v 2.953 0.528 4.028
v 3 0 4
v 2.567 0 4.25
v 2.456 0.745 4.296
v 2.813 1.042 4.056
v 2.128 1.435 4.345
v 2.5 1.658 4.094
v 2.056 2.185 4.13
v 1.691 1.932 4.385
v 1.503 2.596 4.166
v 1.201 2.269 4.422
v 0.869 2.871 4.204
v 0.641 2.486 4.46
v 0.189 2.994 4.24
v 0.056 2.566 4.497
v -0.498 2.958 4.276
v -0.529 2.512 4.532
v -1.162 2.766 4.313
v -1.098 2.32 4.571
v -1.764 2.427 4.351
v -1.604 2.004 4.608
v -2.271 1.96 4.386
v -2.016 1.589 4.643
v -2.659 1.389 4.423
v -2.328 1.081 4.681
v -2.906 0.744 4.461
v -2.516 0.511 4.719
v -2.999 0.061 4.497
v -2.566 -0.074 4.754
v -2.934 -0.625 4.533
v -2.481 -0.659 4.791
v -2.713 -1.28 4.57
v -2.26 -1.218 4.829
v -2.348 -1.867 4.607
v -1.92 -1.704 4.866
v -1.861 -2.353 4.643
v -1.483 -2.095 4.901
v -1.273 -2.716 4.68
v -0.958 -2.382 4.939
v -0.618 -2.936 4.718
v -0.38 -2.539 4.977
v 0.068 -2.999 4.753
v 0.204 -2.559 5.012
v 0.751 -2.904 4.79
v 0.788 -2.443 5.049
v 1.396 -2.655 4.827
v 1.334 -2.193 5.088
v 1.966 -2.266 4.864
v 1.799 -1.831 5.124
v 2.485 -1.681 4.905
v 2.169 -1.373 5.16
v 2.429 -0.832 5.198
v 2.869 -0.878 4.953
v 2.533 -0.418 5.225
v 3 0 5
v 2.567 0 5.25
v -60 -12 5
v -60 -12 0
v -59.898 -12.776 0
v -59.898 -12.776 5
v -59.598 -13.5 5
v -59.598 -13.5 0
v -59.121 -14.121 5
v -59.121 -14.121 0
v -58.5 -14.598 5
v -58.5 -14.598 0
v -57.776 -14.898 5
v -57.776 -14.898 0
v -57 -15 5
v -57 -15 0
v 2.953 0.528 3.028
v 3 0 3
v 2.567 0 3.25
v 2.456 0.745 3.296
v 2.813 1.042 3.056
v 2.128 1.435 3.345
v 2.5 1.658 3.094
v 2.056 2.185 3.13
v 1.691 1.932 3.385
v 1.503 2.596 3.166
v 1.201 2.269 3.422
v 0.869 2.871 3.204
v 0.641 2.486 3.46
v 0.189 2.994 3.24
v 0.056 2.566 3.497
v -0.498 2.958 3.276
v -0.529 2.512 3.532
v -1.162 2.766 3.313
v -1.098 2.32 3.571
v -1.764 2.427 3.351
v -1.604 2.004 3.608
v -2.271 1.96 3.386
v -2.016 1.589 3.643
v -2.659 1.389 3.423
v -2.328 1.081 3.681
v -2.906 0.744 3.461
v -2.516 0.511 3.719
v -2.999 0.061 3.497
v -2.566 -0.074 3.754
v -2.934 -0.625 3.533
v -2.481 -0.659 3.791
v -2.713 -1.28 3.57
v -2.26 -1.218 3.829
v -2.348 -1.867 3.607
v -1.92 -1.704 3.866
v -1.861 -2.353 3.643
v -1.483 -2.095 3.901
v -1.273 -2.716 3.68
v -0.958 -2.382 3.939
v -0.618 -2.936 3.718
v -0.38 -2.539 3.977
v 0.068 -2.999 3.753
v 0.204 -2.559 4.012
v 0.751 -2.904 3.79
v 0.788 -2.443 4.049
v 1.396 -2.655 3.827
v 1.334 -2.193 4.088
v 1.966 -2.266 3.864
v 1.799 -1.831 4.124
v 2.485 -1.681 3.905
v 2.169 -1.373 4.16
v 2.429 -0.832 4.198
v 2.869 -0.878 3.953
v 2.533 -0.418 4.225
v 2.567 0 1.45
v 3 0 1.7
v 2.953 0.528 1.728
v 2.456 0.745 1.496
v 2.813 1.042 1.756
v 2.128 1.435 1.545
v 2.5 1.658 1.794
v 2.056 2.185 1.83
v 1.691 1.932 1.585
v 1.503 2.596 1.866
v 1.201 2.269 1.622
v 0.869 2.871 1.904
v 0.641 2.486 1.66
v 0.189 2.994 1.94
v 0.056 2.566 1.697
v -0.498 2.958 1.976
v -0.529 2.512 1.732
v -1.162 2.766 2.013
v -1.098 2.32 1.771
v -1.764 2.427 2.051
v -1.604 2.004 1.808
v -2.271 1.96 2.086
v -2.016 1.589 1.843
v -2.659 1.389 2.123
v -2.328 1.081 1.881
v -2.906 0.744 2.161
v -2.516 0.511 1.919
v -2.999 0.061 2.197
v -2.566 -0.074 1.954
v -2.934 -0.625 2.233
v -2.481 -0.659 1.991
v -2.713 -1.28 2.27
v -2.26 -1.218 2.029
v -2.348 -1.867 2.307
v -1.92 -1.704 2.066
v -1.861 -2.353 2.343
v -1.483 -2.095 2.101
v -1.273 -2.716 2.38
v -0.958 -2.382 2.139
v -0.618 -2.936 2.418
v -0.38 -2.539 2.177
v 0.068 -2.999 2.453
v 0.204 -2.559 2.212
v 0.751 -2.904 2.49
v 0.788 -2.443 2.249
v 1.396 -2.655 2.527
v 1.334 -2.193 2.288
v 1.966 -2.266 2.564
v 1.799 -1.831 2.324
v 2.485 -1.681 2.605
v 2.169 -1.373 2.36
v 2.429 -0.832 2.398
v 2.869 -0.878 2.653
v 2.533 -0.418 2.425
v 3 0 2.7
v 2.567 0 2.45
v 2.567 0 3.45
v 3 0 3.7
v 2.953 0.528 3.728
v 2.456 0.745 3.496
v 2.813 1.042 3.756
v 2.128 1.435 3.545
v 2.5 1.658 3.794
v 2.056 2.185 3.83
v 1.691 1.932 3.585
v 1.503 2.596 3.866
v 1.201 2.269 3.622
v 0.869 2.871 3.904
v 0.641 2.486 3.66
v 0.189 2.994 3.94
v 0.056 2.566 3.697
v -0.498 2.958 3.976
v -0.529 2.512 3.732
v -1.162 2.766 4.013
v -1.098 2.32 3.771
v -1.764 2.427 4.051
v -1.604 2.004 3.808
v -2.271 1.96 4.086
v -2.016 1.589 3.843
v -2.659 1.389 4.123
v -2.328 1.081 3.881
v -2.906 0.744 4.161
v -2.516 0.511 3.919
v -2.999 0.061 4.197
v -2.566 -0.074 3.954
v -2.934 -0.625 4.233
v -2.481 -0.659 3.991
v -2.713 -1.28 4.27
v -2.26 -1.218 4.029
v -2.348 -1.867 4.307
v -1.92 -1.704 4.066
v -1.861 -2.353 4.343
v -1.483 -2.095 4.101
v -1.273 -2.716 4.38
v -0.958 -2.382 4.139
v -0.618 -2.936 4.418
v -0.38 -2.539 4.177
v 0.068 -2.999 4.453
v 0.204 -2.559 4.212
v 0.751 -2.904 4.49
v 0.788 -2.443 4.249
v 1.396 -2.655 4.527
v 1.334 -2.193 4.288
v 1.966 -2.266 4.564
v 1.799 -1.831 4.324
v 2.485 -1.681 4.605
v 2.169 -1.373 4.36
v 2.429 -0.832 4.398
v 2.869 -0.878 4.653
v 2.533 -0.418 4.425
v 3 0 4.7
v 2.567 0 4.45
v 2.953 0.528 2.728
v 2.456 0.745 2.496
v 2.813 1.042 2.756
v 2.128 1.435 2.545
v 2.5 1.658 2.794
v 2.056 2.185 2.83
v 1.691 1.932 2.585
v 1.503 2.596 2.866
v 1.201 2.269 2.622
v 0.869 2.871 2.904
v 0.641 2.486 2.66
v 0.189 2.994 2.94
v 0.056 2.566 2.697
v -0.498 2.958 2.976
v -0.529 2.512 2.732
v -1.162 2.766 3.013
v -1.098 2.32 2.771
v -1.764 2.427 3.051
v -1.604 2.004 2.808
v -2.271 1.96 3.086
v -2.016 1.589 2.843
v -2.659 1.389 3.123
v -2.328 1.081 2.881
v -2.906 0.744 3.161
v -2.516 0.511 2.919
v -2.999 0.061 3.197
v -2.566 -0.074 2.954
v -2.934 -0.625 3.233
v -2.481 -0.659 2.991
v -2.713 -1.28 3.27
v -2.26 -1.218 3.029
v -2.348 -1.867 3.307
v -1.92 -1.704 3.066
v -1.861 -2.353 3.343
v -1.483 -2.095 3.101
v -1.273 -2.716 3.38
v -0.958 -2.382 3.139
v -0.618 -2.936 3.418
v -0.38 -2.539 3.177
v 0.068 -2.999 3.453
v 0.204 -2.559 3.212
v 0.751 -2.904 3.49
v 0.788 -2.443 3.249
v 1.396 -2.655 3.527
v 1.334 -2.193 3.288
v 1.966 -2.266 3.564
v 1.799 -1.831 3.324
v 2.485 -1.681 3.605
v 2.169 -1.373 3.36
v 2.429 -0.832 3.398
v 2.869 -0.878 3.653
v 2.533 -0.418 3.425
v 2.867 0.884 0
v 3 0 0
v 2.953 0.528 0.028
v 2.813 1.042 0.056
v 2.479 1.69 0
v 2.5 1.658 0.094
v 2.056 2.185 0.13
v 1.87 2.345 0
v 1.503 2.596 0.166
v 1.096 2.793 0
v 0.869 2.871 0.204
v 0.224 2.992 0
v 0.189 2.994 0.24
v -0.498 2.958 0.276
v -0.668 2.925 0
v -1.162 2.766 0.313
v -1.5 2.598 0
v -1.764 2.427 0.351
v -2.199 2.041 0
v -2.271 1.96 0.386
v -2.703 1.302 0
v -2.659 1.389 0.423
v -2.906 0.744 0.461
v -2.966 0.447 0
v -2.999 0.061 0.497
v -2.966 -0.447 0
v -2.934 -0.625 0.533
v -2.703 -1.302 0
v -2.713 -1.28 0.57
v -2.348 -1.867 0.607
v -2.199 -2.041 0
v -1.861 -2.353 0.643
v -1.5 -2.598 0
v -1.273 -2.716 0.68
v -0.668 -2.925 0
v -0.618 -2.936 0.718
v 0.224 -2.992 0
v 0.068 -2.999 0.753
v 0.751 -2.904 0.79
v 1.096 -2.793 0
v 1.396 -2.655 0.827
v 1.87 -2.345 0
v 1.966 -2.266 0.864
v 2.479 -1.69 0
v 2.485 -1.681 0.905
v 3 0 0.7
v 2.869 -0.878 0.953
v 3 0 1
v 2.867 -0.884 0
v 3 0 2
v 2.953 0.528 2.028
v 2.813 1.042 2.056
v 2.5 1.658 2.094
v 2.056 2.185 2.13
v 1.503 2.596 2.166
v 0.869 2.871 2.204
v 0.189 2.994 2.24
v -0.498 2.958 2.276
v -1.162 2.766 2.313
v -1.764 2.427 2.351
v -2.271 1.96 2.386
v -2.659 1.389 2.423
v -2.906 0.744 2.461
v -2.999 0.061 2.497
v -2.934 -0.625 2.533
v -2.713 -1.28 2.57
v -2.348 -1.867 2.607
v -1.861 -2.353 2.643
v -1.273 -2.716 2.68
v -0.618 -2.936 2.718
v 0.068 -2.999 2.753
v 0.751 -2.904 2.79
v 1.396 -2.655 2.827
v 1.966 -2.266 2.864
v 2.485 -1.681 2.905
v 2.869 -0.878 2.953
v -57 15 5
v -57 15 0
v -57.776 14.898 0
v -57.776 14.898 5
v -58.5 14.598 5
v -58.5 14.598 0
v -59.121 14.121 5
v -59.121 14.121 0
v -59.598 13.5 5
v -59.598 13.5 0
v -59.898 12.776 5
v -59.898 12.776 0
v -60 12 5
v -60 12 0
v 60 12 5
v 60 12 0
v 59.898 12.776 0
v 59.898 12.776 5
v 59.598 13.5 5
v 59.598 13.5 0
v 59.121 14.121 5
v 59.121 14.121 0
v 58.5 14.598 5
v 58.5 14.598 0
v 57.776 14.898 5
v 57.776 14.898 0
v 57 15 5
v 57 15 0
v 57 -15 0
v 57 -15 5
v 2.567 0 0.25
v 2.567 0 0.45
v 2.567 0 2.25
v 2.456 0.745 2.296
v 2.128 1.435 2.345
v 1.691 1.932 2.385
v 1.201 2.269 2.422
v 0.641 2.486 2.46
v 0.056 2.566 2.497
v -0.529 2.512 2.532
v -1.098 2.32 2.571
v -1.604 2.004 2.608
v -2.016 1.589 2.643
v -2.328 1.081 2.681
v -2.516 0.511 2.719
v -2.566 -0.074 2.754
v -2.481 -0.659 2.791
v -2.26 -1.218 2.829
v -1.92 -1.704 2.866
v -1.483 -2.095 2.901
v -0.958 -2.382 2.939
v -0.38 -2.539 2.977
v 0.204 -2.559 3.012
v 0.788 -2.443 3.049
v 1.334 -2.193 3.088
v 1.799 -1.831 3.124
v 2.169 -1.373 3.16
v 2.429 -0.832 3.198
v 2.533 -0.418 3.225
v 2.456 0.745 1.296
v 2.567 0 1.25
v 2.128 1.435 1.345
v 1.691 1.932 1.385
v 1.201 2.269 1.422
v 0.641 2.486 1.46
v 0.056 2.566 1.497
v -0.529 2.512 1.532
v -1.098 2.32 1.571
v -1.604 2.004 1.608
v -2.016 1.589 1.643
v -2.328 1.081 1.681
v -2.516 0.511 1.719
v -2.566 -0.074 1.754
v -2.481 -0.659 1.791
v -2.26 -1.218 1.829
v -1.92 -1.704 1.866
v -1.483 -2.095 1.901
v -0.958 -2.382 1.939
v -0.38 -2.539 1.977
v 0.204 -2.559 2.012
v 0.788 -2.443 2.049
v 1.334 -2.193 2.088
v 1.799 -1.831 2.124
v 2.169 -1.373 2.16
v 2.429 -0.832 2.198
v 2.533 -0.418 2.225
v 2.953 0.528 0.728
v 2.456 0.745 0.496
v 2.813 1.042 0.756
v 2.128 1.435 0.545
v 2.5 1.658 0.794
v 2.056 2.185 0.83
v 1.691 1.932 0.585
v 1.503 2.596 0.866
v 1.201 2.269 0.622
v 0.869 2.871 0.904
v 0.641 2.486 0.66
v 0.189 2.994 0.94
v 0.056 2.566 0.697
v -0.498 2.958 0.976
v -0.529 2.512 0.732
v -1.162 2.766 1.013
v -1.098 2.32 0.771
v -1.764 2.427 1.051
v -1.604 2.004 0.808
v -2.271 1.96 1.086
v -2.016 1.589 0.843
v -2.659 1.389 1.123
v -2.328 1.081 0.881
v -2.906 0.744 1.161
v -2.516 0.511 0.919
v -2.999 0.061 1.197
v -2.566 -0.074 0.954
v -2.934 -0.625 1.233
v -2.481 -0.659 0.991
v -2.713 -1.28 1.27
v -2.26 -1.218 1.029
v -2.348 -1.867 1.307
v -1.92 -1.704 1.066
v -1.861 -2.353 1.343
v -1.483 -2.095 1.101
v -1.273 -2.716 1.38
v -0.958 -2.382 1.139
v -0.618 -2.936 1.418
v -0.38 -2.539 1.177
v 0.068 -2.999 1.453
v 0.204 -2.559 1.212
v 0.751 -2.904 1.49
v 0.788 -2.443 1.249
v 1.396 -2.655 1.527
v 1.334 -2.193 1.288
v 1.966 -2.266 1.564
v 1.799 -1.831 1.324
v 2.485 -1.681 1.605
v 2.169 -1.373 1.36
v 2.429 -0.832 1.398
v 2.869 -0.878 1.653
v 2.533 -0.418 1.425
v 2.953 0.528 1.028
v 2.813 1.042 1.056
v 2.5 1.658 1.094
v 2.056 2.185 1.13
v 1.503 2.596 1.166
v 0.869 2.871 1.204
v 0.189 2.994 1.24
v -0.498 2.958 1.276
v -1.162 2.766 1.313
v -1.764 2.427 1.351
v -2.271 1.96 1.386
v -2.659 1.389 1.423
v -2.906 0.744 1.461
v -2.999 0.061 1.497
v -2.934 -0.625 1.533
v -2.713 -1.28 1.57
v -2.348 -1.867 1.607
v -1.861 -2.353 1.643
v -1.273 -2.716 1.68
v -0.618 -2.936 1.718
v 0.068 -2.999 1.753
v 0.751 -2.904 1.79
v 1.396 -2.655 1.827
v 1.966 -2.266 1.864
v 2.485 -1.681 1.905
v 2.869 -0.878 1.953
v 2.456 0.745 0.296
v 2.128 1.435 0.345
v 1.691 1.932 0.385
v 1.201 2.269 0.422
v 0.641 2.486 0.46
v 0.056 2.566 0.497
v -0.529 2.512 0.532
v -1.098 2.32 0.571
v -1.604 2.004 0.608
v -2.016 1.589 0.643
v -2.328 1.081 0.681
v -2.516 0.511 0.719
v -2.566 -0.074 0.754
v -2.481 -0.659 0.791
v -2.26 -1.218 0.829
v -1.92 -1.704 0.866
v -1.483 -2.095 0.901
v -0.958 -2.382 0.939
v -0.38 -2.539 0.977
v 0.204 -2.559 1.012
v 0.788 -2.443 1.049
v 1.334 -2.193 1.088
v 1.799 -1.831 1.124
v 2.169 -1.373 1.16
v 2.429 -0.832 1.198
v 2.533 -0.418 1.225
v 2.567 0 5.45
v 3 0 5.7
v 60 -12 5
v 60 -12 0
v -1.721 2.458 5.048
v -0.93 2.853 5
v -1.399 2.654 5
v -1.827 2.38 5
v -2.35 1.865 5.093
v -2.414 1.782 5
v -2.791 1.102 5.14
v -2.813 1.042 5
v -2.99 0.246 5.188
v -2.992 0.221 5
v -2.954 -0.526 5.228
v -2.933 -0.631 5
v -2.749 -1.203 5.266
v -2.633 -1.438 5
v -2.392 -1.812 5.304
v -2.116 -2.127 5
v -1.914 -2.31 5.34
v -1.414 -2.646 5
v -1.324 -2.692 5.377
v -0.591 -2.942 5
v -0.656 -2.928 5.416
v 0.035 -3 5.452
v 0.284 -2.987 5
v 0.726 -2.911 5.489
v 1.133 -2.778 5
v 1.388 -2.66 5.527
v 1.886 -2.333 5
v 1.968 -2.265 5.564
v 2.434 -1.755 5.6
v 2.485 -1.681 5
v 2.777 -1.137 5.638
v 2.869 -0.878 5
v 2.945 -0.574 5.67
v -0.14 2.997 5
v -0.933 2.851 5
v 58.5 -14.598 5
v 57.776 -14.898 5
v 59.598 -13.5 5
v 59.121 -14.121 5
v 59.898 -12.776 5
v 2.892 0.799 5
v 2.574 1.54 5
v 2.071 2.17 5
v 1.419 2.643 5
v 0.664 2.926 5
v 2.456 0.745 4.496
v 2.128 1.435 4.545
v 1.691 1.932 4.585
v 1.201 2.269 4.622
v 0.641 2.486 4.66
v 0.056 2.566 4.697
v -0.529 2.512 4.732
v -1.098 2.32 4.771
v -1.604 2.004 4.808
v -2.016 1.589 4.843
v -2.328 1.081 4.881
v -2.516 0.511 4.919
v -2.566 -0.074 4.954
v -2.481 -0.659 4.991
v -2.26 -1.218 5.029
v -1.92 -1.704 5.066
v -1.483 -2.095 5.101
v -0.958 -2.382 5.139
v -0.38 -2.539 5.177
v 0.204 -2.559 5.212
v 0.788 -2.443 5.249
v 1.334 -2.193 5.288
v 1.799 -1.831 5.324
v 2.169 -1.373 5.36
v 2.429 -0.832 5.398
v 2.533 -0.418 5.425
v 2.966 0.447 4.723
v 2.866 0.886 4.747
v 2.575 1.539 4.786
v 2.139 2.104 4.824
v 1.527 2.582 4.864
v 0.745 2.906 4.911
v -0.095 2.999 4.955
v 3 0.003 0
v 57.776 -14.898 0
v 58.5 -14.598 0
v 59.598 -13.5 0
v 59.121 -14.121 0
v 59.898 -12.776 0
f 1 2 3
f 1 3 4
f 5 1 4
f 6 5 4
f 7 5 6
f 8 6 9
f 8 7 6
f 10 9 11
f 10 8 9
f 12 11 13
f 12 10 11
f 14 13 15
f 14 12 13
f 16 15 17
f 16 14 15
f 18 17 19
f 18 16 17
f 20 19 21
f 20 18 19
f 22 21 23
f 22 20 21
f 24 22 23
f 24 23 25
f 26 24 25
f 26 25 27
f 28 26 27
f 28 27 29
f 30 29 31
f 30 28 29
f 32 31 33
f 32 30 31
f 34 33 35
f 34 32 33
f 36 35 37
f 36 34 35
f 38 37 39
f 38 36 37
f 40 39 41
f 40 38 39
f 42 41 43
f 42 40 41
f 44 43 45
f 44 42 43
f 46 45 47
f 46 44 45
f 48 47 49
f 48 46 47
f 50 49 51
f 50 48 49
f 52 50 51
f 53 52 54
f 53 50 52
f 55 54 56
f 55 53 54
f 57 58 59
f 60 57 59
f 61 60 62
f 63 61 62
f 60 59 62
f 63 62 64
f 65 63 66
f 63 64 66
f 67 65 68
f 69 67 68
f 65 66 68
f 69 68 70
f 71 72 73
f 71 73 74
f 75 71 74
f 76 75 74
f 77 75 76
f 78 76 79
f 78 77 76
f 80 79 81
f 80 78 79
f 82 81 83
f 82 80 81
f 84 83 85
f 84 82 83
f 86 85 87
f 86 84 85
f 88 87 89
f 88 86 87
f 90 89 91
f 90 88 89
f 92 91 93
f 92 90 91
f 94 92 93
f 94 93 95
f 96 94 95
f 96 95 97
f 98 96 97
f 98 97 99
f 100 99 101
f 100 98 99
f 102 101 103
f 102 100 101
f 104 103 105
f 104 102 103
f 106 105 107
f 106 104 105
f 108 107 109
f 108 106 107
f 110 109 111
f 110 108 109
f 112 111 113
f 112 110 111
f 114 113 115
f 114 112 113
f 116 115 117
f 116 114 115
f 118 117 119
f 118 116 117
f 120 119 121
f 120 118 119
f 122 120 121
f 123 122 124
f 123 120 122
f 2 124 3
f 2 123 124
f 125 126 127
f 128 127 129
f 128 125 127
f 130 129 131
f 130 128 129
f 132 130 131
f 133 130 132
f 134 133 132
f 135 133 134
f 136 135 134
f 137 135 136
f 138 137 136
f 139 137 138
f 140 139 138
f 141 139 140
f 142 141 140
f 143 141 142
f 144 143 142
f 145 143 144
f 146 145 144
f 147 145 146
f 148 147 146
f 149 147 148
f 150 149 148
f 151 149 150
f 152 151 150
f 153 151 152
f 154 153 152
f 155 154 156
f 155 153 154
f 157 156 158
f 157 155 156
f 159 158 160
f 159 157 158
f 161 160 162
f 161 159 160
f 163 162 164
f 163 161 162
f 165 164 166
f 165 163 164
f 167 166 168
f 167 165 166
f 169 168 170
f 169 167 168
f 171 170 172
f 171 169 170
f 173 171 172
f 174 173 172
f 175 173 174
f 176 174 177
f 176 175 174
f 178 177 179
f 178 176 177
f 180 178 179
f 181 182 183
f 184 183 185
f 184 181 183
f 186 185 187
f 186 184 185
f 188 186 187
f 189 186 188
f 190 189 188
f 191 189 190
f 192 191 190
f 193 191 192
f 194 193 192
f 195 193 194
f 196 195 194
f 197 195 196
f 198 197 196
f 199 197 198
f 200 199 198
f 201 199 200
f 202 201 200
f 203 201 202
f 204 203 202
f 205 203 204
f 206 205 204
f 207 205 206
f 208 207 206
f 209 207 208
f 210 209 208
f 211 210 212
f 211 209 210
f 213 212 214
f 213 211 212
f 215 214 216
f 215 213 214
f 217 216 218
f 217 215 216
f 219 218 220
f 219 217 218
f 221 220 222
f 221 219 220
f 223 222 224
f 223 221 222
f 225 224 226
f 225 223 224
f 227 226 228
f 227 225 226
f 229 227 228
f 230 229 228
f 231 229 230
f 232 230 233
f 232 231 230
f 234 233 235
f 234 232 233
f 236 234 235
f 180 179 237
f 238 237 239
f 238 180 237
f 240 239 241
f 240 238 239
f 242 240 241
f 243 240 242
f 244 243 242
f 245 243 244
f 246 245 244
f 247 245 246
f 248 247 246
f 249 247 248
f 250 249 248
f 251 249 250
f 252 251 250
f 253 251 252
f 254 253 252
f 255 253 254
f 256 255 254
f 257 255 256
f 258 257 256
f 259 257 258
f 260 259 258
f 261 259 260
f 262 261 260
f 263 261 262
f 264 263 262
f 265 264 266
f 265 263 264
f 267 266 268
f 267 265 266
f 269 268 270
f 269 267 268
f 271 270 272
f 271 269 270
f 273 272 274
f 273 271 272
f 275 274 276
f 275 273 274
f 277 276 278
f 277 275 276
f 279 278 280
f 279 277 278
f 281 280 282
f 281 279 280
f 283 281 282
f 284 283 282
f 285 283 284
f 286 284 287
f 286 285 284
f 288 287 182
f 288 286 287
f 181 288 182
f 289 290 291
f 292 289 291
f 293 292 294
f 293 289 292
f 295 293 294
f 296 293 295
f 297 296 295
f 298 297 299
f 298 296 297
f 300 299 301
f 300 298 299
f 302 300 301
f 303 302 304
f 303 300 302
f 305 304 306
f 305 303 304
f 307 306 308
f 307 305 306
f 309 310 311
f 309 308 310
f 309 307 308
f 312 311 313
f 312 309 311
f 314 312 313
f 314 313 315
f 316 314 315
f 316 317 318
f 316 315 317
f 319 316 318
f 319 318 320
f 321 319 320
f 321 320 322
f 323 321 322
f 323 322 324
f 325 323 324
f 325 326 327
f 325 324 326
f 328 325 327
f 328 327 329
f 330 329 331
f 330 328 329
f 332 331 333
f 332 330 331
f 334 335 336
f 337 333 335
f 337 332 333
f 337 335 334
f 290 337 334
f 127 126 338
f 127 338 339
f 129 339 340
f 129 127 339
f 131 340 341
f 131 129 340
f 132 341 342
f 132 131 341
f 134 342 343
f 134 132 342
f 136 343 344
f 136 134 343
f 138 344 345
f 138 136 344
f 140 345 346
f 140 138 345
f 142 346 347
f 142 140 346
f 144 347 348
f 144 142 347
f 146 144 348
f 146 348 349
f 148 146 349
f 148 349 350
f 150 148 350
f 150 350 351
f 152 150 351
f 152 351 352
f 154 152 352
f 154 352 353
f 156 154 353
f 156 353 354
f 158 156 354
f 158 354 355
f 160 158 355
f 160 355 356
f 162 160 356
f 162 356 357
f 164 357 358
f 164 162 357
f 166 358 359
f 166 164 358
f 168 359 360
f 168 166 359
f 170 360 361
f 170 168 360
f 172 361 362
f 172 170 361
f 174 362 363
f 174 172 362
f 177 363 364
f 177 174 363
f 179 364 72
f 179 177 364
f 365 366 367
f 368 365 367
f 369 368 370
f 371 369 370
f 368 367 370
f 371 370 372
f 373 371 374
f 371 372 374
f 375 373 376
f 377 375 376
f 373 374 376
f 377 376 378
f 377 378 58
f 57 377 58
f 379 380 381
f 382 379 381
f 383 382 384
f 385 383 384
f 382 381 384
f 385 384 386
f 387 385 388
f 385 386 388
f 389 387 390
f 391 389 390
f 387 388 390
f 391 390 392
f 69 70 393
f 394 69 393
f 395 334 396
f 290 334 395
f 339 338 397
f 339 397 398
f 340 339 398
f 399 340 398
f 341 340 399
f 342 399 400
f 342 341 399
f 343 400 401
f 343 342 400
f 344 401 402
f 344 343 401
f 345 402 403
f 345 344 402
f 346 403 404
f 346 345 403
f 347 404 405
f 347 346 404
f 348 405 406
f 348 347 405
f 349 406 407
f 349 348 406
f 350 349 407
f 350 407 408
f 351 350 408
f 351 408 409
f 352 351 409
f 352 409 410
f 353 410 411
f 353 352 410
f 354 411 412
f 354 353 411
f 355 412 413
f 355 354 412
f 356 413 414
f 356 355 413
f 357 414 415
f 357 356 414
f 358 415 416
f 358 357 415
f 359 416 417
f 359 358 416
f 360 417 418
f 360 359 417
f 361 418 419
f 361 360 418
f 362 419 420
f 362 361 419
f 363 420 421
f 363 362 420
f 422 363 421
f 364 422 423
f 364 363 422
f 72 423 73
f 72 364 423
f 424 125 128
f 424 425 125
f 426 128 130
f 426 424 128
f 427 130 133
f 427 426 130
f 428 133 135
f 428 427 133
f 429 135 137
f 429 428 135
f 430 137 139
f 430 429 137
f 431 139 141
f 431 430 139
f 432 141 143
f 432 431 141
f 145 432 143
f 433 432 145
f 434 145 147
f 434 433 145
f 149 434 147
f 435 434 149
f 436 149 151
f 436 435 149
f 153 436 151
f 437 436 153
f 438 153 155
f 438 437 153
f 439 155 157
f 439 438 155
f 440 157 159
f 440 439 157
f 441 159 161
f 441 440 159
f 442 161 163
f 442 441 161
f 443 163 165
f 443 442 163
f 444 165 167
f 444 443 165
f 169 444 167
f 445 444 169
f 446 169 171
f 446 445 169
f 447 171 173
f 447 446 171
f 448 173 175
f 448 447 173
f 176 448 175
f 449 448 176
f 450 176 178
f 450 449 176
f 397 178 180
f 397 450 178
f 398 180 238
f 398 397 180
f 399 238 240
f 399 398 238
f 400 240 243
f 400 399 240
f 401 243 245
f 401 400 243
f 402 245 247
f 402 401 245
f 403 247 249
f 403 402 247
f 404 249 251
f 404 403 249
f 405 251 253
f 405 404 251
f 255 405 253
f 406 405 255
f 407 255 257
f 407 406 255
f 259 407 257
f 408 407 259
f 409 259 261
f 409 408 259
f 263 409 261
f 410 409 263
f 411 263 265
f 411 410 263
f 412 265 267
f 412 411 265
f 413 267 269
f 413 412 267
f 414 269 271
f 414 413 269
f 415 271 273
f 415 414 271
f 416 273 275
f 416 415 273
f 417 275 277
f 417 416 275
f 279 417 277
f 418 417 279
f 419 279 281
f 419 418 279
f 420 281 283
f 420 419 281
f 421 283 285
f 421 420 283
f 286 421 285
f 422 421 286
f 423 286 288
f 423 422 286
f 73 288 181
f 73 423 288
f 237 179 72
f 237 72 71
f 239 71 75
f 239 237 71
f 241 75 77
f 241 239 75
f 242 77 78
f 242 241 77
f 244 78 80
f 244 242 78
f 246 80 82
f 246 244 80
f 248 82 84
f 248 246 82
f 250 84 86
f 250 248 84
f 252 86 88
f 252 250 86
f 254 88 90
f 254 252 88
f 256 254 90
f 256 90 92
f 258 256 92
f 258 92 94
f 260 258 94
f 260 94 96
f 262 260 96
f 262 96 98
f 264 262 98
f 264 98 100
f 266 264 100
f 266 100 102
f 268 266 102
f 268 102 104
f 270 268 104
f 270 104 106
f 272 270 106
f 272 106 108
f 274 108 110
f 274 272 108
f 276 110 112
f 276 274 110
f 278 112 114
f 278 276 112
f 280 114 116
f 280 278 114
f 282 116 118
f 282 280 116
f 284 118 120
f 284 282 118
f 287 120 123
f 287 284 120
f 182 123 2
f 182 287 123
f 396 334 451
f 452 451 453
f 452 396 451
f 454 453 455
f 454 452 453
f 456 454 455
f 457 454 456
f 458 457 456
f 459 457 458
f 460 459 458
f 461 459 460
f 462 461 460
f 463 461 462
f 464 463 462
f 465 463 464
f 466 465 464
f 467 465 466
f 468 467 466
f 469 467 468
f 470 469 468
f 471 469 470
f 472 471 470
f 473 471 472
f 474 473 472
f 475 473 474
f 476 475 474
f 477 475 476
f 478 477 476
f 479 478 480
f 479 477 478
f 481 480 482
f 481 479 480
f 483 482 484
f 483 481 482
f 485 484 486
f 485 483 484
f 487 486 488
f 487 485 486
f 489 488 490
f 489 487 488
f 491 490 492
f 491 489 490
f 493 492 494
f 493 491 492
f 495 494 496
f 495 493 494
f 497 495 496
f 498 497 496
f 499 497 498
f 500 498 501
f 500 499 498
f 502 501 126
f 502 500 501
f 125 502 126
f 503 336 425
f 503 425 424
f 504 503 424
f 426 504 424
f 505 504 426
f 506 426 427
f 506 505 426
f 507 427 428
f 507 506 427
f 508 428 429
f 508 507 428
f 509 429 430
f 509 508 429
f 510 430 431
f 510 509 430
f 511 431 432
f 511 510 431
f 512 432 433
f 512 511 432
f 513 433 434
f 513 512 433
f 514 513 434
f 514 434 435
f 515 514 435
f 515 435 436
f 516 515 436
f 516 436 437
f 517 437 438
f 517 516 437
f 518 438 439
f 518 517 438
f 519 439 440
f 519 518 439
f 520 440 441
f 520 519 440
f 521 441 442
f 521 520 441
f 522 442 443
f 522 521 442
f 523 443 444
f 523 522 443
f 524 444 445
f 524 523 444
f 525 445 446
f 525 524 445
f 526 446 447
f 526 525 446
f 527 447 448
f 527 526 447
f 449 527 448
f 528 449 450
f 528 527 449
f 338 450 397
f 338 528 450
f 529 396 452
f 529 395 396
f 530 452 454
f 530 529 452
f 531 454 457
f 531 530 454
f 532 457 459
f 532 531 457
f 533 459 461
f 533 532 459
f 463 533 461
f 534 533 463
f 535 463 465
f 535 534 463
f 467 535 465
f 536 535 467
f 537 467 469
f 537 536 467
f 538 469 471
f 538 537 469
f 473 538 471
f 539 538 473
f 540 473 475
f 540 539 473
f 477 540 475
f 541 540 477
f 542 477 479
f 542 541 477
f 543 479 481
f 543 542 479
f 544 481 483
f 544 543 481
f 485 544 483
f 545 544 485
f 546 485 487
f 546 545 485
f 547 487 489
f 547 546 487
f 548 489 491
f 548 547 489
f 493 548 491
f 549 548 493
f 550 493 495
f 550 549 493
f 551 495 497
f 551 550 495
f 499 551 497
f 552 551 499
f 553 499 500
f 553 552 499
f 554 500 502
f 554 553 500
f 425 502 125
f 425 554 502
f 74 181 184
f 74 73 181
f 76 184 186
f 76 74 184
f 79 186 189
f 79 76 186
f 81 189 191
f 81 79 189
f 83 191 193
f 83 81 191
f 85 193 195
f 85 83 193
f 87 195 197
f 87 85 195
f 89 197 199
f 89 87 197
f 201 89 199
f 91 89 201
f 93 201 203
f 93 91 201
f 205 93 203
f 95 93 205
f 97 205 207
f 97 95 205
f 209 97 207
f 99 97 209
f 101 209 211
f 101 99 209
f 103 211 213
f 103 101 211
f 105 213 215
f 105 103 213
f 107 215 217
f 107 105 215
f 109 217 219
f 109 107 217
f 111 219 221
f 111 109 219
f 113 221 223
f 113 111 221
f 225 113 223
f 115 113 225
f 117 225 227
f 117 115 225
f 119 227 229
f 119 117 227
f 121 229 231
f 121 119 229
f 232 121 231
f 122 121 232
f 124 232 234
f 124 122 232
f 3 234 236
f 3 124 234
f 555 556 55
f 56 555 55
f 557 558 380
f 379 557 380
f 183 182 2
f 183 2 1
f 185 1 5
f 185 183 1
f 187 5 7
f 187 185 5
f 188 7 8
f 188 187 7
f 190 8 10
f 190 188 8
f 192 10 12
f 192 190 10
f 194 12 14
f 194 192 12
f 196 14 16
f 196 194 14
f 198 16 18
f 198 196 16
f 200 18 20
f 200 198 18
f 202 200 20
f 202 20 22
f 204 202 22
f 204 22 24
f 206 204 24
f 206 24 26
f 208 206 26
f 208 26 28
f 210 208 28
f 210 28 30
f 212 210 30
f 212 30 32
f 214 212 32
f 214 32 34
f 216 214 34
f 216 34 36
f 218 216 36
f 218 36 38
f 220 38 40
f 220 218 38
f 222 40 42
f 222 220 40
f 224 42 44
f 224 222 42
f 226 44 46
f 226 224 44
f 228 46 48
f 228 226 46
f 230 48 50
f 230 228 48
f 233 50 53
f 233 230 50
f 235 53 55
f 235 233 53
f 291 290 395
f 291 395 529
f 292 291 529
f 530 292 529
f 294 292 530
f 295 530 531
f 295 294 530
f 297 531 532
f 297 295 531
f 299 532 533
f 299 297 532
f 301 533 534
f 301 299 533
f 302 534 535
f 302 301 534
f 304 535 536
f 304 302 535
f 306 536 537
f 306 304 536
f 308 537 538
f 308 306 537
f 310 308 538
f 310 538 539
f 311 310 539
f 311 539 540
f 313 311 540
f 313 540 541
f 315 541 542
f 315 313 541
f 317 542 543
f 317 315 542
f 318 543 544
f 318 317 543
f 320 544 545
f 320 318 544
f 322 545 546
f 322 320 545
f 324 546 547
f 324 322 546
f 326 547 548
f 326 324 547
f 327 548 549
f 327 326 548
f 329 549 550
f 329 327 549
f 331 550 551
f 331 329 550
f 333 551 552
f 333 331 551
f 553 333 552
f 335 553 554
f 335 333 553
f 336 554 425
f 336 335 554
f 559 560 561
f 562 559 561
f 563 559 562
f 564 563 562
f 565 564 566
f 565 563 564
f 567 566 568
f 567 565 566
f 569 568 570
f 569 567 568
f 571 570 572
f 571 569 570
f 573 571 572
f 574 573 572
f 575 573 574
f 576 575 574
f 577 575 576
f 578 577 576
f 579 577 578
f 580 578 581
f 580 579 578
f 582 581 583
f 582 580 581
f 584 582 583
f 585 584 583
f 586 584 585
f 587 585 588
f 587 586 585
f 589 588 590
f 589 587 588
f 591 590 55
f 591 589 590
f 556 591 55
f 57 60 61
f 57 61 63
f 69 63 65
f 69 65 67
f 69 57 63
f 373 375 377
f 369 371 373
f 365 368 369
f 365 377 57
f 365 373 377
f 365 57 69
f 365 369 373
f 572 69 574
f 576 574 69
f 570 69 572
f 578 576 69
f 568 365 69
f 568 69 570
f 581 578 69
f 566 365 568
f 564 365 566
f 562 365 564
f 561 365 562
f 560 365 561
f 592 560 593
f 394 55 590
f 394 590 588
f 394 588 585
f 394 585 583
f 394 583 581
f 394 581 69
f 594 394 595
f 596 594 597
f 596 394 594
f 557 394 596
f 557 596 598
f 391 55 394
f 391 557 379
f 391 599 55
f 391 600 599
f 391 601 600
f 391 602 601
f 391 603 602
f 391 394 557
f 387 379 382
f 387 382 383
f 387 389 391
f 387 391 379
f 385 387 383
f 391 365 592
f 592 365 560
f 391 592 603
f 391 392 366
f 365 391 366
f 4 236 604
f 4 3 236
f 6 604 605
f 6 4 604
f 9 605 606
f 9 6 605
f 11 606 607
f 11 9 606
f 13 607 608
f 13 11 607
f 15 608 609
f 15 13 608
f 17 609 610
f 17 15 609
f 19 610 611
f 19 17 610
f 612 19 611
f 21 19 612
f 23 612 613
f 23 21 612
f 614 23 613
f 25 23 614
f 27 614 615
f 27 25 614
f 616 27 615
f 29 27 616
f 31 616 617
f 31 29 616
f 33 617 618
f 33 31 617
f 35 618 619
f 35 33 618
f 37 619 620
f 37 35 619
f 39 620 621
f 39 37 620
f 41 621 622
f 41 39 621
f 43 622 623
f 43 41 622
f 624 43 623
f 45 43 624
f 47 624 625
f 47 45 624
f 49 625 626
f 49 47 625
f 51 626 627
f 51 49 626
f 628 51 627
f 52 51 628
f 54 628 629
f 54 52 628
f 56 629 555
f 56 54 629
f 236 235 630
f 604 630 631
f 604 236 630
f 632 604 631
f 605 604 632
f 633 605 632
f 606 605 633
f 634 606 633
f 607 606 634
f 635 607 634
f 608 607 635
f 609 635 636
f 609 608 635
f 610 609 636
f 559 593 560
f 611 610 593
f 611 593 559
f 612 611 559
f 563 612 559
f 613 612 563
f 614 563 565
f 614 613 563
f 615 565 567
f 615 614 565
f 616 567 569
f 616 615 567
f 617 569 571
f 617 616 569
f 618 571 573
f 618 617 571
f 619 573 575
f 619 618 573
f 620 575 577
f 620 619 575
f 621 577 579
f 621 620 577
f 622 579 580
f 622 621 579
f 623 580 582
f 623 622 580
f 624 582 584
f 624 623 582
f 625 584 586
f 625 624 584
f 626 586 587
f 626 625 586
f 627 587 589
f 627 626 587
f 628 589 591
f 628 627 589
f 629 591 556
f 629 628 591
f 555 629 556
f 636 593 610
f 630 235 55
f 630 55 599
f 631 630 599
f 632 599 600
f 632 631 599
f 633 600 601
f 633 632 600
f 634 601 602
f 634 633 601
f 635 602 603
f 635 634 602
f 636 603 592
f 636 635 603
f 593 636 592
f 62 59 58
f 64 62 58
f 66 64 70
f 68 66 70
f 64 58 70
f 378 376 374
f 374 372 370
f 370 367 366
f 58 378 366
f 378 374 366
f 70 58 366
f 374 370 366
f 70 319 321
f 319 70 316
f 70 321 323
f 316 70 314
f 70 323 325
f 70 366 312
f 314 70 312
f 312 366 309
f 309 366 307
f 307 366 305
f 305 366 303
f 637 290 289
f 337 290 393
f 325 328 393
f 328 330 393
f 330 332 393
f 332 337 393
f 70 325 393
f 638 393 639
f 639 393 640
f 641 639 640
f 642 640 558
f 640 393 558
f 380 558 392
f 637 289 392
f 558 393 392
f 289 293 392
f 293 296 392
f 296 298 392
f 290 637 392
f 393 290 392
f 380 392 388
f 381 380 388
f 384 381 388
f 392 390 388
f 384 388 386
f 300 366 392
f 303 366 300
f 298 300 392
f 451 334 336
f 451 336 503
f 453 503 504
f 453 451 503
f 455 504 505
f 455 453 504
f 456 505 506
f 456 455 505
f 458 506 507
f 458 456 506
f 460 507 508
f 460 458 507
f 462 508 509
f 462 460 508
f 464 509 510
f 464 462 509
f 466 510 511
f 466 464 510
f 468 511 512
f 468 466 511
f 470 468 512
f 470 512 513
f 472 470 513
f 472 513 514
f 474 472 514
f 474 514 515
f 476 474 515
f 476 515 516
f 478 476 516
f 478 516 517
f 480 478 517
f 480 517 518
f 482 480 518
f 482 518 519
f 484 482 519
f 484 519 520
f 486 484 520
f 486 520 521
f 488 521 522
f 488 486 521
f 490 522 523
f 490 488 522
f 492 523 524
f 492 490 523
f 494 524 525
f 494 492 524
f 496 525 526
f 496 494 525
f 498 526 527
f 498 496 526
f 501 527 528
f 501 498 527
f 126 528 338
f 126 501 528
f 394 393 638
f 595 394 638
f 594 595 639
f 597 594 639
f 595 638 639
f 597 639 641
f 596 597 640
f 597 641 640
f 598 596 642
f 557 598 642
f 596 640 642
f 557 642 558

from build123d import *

# Parameters (mm, degrees)
SKETCH2_R           = 3
BOSS_EXTRUDE1_DEPTH = 5
THREAD1_PITCH       = 1


with BuildPart() as part:
    # Sketch2 → Boss-Extrude1 (new body)
    with BuildSketch(Plane.XY):
        with BuildLine():
            Line((-57, -15), (57, -15))
            ThreePointArc((57, -15), (59.121320344, -14.121320344), (60, -12))
            Line((60, -12), (60, 12))
            ThreePointArc((60, 12), (59.121320344, 14.121320344), (57, 15))
            Line((57, 15), (-57, 15))
            ThreePointArc((-57, 15), (-59.121320344, 14.121320344), (-60, 12))
            Line((-60, 12), (-60, -12))
            ThreePointArc((-60, -12), (-59.121320344, -14.121320344), (-57, -15))
        make_face()
        Circle(SKETCH2_R, mode=Mode.SUBTRACT)
    extrude(amount=BOSS_EXTRUDE1_DEPTH)

    # Thread1: the profile of Thread Profile2 profile screwed along a right-hand helix of 5 turns, 8 arcs to a turn; built about Z, then put on its axis
    thread1_z = Axis((0, 0, 0), (0, 0, 1))
    thread1_corners = [(3.0003, 0, -0.000173205), (3.0003, 0, 0.700173203), (2.5669873, 0, 0.449999999), (2.5669873, 0, 0.249999999)]
    with BuildLine(mode=Mode.PRIVATE) as thread1_profile:
        Line(thread1_corners[0], thread1_corners[1])
        Line(thread1_corners[1], thread1_corners[2])
        Line(thread1_corners[2], thread1_corners[3])
        Line(thread1_corners[3], thread1_corners[0])
    thread1_cap = Face(thread1_profile.wire())
    thread1_turn_angles = [0, 22.5, 45, 67.5, 90, 112.5, 135, 157.5, 180, 202.5, 225, 247.5, 270, 292.5, 315, 337.5, 360]
    thread1_turn_weights = [1, 0.9238795325112867, 1, 0.9238795325112867, 1, 0.9238795325112867, 1, 0.9238795325112867, 1, 0.9238795325112867, 1, 0.9238795325112867, 1, 0.9238795325112867, 1, 0.9238795325112867, 1]
    thread1_turn_rails = [Edge.make_bspline([Vector(p[0], p[1], 0).rotate(thread1_z, thread1_turn_angles[k]) / thread1_turn_weights[k] + Vector(0, 0, p[2] + THREAD1_PITCH * thread1_turn_angles[k] / 360) for k in range(17)], [0, 0, 0, 1, 1, 2, 2, 3, 3, 4, 4, 5, 5, 6, 6, 7, 7, 8, 8, 8], 2, thread1_turn_weights) for p in thread1_corners]
    thread1_turn_sides = [Face.make_surface_from_curves(thread1_turn_rails[p[0]], thread1_turn_rails[p[1]]) for p in [(0, 1), (1, 2), (2, 3), (3, 0)]]
    thread1 = Plane(origin=(0, 0, 0), x_dir=(1, 0, 0), z_dir=(0, 0, 1)) * Solid(Shell([*[p.moved(Location((0, 0, THREAD1_PITCH * i))) for i in range(5) for p in thread1_turn_sides], thread1_cap, thread1_cap.rotate(thread1_z, 1800).moved(Location((0, 0, THREAD1_PITCH * 1800 / 360)))]))
    add(thread1)


solid = part.part
